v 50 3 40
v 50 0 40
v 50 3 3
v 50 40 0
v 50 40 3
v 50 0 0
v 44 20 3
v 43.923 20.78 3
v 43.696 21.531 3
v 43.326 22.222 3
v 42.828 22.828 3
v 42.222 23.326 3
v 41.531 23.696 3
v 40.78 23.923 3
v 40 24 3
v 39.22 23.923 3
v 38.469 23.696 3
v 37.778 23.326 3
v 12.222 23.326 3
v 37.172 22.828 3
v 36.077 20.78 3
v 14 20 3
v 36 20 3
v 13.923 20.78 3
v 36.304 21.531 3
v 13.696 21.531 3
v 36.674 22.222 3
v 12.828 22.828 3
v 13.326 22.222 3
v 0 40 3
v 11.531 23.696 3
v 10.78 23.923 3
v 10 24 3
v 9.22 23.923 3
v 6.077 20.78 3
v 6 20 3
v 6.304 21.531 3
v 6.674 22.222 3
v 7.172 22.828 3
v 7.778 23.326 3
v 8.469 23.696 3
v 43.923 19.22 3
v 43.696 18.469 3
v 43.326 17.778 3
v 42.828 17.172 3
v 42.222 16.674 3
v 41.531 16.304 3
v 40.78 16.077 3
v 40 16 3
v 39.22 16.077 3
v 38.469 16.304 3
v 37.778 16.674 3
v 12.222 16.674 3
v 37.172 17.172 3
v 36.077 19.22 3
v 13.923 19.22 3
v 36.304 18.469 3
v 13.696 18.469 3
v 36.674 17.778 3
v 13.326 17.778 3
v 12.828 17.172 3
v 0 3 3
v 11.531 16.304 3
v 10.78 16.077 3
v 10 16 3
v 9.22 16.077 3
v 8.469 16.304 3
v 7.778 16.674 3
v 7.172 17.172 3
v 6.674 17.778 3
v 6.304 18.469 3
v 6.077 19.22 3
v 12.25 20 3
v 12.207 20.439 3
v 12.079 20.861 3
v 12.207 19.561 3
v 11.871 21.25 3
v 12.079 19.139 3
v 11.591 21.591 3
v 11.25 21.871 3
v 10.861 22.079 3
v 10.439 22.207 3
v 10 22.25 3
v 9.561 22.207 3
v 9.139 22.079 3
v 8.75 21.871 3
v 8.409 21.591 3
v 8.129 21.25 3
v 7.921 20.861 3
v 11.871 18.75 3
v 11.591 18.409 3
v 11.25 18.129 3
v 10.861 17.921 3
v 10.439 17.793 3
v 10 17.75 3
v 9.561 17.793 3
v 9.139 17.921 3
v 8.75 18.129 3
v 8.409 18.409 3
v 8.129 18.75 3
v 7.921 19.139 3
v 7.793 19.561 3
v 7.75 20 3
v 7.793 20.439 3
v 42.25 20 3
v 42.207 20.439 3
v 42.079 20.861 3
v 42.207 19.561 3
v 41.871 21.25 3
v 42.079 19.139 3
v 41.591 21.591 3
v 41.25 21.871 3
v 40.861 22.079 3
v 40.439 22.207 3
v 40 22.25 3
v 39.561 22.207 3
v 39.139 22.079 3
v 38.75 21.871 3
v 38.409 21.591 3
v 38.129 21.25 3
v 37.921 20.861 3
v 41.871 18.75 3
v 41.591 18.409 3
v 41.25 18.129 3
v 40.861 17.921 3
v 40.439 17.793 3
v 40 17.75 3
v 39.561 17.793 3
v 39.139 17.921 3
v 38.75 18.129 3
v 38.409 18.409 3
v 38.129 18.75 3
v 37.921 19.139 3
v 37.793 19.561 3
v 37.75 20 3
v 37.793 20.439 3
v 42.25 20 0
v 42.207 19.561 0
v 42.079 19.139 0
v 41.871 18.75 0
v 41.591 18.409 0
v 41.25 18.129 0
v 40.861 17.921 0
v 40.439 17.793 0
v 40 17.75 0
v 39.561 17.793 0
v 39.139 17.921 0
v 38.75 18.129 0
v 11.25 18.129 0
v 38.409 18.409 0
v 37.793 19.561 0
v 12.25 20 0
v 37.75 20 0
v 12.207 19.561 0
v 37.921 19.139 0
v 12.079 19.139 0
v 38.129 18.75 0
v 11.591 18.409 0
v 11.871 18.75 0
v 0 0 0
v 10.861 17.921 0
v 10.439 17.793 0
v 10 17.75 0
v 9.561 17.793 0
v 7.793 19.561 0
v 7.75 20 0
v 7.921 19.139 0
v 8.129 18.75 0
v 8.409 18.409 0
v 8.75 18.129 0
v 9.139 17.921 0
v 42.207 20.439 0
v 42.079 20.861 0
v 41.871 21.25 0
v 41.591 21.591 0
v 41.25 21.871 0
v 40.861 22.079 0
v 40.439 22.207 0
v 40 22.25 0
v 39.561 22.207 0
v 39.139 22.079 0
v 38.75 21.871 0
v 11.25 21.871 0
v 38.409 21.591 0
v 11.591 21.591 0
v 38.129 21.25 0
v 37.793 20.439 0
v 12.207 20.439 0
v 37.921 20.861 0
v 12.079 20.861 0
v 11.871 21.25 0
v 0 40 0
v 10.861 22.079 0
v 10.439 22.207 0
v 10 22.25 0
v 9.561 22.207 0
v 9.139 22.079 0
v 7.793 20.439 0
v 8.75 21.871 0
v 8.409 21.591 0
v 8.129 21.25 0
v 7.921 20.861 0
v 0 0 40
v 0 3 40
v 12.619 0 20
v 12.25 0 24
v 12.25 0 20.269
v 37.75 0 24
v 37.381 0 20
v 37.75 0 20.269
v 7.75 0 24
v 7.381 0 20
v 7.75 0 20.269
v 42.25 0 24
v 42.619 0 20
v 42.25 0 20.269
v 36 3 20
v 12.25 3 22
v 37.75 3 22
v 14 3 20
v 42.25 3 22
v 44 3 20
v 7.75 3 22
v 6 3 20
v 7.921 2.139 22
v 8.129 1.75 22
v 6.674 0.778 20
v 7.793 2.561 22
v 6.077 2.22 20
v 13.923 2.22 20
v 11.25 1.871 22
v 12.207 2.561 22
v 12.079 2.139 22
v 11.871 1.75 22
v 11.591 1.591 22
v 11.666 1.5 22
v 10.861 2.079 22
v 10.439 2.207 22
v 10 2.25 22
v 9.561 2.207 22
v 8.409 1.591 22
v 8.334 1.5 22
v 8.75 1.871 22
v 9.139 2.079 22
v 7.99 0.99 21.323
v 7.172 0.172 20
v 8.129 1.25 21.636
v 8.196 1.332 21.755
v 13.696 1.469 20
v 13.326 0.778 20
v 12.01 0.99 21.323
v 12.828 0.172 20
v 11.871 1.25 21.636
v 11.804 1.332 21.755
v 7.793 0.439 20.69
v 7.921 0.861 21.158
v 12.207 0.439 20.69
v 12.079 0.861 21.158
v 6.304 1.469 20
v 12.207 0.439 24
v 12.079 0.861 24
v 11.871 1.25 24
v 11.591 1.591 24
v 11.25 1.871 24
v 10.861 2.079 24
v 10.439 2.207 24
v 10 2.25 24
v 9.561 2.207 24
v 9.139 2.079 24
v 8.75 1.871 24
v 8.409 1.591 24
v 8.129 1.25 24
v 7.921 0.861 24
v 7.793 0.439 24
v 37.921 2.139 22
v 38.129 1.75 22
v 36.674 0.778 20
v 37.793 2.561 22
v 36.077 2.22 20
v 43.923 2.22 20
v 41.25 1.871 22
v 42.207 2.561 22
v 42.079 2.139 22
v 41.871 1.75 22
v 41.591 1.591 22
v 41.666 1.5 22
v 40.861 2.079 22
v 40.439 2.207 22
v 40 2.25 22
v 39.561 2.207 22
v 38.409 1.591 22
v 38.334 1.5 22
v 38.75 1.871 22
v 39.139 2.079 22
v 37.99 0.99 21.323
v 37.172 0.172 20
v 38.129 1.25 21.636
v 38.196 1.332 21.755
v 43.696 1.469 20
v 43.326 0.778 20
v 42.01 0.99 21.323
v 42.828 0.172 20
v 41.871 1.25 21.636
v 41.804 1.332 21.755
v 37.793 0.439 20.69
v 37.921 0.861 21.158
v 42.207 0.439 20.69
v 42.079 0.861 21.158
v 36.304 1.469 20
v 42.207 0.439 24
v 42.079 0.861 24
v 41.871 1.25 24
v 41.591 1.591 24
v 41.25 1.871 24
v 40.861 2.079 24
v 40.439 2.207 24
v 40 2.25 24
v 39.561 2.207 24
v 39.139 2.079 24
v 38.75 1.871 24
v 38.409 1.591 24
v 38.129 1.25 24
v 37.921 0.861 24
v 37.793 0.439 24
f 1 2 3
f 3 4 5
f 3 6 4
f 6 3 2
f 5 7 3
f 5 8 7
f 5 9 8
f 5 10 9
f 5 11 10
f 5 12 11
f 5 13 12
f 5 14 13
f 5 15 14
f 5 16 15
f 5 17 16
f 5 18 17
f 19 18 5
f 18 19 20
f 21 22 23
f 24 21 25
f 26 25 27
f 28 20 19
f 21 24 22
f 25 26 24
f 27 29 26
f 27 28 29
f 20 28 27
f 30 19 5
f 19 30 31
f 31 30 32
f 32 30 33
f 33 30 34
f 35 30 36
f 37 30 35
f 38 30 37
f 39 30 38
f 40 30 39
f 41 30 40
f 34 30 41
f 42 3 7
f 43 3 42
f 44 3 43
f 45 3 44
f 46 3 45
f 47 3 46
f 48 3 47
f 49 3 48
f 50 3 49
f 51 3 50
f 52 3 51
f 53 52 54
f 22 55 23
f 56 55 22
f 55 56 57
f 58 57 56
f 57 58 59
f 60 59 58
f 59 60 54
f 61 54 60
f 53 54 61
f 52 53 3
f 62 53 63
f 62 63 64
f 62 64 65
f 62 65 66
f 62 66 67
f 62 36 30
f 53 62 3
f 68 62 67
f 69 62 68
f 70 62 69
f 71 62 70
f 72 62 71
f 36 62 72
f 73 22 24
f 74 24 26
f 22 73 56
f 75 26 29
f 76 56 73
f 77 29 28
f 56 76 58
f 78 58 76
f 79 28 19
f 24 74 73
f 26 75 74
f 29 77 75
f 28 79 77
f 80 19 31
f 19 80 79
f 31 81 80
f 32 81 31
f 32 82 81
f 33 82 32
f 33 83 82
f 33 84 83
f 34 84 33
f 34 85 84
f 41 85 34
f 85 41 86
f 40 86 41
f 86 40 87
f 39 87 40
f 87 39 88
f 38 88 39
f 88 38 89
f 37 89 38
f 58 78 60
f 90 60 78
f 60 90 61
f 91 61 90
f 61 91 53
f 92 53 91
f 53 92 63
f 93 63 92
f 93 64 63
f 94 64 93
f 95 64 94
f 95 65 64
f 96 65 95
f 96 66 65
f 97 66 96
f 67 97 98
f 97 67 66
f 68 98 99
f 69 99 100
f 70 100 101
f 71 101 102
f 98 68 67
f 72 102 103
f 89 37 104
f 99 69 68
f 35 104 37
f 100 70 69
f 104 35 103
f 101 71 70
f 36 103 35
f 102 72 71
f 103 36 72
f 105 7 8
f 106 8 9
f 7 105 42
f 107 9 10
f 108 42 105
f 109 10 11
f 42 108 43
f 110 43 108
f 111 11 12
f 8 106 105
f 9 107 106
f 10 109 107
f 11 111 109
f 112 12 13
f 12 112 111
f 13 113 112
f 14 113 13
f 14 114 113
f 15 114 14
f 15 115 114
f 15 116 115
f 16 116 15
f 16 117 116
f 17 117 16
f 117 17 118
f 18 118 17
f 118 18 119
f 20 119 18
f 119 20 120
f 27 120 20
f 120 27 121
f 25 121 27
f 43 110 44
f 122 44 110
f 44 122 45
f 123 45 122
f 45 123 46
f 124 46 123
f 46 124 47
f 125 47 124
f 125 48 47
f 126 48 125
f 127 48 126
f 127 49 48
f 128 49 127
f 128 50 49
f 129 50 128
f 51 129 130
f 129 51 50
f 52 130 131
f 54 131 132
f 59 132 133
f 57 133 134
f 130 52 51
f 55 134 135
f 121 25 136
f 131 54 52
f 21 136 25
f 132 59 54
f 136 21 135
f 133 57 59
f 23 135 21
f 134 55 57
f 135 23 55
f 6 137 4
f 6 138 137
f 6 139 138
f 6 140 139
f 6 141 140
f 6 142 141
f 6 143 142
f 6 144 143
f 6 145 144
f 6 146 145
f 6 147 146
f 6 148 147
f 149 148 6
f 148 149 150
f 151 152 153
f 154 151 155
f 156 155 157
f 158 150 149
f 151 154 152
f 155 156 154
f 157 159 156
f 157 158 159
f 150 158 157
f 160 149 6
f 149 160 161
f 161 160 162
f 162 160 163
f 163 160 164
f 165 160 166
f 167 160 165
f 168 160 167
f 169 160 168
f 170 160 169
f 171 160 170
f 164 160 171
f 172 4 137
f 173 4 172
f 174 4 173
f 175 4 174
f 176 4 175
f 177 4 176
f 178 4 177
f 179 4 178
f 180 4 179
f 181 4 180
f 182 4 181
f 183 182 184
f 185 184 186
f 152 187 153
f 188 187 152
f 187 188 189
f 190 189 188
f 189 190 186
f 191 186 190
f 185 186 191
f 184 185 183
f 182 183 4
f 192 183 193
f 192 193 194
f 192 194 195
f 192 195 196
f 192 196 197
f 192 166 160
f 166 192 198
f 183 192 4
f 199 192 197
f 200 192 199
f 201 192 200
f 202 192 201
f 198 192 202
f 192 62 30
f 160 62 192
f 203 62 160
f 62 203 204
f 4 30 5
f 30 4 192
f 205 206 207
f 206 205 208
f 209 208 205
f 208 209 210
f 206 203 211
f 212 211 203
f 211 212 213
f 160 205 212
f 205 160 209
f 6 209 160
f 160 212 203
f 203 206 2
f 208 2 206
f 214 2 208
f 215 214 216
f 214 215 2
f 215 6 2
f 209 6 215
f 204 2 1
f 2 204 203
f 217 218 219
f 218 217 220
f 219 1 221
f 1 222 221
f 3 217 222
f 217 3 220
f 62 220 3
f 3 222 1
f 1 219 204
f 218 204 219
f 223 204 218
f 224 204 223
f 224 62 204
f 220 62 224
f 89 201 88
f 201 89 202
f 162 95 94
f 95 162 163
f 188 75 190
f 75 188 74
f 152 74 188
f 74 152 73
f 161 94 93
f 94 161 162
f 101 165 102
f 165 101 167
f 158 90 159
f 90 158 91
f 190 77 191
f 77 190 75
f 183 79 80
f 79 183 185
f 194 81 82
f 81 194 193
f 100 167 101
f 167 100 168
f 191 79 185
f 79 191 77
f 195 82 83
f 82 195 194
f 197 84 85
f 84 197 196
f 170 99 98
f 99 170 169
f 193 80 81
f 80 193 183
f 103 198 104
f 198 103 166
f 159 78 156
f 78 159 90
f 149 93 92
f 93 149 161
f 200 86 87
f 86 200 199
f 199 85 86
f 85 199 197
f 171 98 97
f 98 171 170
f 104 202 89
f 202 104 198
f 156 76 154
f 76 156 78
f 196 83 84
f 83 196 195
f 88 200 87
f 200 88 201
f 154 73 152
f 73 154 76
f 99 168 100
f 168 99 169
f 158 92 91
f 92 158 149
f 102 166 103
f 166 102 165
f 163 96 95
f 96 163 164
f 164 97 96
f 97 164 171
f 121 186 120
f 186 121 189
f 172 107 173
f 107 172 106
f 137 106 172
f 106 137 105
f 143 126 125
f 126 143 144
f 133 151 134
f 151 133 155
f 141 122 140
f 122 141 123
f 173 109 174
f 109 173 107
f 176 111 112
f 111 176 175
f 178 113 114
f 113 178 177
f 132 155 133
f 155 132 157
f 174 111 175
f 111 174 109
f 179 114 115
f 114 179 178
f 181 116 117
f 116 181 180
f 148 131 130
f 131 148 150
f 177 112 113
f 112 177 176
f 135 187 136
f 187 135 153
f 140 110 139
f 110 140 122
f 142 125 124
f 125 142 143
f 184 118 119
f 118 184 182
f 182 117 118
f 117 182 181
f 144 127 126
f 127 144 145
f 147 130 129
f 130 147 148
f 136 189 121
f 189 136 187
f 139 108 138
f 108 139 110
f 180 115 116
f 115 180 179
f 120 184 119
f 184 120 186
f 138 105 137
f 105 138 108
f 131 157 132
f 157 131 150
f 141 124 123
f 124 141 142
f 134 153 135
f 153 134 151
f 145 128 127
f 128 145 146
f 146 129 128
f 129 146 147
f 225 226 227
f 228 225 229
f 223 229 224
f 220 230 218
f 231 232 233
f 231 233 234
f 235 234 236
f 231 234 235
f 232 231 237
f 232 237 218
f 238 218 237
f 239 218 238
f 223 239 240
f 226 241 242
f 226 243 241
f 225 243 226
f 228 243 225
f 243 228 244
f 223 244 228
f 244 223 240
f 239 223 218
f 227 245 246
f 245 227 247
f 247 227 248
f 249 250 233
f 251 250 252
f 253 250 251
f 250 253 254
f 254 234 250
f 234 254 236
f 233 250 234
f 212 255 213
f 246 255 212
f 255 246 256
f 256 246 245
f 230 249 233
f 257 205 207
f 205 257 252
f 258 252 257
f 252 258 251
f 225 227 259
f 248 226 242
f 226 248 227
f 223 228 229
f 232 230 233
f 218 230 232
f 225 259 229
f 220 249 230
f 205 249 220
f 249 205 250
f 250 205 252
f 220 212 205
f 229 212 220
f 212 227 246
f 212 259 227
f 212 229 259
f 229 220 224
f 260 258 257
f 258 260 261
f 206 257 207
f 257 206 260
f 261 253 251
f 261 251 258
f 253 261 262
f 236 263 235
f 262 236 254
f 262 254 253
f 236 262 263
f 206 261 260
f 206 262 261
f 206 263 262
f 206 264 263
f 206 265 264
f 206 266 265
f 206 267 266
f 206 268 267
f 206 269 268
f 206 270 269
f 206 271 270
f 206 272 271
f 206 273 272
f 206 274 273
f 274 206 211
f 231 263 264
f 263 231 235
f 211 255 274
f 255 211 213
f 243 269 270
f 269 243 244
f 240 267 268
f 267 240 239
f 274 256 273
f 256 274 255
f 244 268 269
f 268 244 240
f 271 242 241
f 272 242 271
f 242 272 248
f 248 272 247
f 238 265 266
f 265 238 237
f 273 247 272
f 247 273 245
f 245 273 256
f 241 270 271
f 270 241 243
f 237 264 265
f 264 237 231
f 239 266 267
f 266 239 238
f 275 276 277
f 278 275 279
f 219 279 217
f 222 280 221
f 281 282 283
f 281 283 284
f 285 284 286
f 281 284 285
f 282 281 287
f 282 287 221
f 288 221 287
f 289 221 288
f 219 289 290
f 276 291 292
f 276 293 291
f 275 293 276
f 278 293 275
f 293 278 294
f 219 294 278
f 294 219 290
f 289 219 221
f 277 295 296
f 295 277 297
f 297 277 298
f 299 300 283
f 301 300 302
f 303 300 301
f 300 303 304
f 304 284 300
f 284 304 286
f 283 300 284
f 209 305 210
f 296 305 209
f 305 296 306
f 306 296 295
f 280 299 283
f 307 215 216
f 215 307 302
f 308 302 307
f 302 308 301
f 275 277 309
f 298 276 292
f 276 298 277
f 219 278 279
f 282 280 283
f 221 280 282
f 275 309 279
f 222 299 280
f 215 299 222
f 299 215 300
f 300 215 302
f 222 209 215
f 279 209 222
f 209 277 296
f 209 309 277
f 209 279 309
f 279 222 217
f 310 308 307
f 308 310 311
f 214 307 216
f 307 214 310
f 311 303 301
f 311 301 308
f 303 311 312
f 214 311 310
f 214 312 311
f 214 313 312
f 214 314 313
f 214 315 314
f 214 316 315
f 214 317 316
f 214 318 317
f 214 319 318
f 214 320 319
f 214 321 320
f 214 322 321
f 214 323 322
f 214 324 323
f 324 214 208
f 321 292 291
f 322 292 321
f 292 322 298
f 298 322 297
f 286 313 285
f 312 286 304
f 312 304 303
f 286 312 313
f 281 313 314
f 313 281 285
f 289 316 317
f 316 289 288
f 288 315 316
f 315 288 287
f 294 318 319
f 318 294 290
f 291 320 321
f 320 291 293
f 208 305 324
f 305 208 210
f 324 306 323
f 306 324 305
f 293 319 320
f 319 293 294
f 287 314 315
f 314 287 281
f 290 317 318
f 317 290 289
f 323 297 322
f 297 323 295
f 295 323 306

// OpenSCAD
// L-bracket parameters
width = 50;
depth = 40;
height = 40;
thickness = 3;

// Hole parameters
hole_diameter = 4.5;
countersink_diameter = 8;
countersink_depth = 2;

// Final assembly
difference() {
    // Bracket geometry
    union() {
        // Horizontal plate: X=width, Y=depth, Z=thickness
        // The face is the Z=thickness surface (50x40)
        cube([width, depth, thickness]);
        // Vertical plate: X=width, Y=thickness, Z=height
        // The face is the Y=thickness surface (50x40)
        cube([width, thickness, height]);
    }

    // Holes on the Horizontal face (Top surface: Z = thickness)
    // Center line of depth is Y = depth / 2 = 20
    // Symmetrical X positions: 10mm and (width - 10) = 40mm
    for (x = [10, width - 10]) {
        translate([x, depth / 2, thickness]) {
            // Countersink seat (outward in +Z direction)
            cylinder(d1=countersink_diameter, d2=hole_diameter, h=countersink_depth, $fn=32);
            // Through hole (inward in -Z direction)
            translate([0, 0, -thickness]) 
                cylinder(d=hole_diameter, h=thickness + 1, $fn=32);
        }
    }

    // Holes on the Vertical face (Front surface: Y = thickness)
    // Center line of height is Z = height / 2 = 20
    // Symmetrical X positions: 10mm and (width - 10) = 40mm
    for (x = [10, width - 10]) {
        translate([x, thickness, height / 2]) {
            // Countersink seat (outward in +Y direction)
            cylinder(d1=countersink_diameter, d2=hole_diameter, h=countersink_depth, $fn=32);
            // Through hole (inward in -Y direction)
            translate([0, -thickness, 0]) 
                cylinder(d=hole_diameter, h=thickness + 1, $fn=32);
        }
    }
}
